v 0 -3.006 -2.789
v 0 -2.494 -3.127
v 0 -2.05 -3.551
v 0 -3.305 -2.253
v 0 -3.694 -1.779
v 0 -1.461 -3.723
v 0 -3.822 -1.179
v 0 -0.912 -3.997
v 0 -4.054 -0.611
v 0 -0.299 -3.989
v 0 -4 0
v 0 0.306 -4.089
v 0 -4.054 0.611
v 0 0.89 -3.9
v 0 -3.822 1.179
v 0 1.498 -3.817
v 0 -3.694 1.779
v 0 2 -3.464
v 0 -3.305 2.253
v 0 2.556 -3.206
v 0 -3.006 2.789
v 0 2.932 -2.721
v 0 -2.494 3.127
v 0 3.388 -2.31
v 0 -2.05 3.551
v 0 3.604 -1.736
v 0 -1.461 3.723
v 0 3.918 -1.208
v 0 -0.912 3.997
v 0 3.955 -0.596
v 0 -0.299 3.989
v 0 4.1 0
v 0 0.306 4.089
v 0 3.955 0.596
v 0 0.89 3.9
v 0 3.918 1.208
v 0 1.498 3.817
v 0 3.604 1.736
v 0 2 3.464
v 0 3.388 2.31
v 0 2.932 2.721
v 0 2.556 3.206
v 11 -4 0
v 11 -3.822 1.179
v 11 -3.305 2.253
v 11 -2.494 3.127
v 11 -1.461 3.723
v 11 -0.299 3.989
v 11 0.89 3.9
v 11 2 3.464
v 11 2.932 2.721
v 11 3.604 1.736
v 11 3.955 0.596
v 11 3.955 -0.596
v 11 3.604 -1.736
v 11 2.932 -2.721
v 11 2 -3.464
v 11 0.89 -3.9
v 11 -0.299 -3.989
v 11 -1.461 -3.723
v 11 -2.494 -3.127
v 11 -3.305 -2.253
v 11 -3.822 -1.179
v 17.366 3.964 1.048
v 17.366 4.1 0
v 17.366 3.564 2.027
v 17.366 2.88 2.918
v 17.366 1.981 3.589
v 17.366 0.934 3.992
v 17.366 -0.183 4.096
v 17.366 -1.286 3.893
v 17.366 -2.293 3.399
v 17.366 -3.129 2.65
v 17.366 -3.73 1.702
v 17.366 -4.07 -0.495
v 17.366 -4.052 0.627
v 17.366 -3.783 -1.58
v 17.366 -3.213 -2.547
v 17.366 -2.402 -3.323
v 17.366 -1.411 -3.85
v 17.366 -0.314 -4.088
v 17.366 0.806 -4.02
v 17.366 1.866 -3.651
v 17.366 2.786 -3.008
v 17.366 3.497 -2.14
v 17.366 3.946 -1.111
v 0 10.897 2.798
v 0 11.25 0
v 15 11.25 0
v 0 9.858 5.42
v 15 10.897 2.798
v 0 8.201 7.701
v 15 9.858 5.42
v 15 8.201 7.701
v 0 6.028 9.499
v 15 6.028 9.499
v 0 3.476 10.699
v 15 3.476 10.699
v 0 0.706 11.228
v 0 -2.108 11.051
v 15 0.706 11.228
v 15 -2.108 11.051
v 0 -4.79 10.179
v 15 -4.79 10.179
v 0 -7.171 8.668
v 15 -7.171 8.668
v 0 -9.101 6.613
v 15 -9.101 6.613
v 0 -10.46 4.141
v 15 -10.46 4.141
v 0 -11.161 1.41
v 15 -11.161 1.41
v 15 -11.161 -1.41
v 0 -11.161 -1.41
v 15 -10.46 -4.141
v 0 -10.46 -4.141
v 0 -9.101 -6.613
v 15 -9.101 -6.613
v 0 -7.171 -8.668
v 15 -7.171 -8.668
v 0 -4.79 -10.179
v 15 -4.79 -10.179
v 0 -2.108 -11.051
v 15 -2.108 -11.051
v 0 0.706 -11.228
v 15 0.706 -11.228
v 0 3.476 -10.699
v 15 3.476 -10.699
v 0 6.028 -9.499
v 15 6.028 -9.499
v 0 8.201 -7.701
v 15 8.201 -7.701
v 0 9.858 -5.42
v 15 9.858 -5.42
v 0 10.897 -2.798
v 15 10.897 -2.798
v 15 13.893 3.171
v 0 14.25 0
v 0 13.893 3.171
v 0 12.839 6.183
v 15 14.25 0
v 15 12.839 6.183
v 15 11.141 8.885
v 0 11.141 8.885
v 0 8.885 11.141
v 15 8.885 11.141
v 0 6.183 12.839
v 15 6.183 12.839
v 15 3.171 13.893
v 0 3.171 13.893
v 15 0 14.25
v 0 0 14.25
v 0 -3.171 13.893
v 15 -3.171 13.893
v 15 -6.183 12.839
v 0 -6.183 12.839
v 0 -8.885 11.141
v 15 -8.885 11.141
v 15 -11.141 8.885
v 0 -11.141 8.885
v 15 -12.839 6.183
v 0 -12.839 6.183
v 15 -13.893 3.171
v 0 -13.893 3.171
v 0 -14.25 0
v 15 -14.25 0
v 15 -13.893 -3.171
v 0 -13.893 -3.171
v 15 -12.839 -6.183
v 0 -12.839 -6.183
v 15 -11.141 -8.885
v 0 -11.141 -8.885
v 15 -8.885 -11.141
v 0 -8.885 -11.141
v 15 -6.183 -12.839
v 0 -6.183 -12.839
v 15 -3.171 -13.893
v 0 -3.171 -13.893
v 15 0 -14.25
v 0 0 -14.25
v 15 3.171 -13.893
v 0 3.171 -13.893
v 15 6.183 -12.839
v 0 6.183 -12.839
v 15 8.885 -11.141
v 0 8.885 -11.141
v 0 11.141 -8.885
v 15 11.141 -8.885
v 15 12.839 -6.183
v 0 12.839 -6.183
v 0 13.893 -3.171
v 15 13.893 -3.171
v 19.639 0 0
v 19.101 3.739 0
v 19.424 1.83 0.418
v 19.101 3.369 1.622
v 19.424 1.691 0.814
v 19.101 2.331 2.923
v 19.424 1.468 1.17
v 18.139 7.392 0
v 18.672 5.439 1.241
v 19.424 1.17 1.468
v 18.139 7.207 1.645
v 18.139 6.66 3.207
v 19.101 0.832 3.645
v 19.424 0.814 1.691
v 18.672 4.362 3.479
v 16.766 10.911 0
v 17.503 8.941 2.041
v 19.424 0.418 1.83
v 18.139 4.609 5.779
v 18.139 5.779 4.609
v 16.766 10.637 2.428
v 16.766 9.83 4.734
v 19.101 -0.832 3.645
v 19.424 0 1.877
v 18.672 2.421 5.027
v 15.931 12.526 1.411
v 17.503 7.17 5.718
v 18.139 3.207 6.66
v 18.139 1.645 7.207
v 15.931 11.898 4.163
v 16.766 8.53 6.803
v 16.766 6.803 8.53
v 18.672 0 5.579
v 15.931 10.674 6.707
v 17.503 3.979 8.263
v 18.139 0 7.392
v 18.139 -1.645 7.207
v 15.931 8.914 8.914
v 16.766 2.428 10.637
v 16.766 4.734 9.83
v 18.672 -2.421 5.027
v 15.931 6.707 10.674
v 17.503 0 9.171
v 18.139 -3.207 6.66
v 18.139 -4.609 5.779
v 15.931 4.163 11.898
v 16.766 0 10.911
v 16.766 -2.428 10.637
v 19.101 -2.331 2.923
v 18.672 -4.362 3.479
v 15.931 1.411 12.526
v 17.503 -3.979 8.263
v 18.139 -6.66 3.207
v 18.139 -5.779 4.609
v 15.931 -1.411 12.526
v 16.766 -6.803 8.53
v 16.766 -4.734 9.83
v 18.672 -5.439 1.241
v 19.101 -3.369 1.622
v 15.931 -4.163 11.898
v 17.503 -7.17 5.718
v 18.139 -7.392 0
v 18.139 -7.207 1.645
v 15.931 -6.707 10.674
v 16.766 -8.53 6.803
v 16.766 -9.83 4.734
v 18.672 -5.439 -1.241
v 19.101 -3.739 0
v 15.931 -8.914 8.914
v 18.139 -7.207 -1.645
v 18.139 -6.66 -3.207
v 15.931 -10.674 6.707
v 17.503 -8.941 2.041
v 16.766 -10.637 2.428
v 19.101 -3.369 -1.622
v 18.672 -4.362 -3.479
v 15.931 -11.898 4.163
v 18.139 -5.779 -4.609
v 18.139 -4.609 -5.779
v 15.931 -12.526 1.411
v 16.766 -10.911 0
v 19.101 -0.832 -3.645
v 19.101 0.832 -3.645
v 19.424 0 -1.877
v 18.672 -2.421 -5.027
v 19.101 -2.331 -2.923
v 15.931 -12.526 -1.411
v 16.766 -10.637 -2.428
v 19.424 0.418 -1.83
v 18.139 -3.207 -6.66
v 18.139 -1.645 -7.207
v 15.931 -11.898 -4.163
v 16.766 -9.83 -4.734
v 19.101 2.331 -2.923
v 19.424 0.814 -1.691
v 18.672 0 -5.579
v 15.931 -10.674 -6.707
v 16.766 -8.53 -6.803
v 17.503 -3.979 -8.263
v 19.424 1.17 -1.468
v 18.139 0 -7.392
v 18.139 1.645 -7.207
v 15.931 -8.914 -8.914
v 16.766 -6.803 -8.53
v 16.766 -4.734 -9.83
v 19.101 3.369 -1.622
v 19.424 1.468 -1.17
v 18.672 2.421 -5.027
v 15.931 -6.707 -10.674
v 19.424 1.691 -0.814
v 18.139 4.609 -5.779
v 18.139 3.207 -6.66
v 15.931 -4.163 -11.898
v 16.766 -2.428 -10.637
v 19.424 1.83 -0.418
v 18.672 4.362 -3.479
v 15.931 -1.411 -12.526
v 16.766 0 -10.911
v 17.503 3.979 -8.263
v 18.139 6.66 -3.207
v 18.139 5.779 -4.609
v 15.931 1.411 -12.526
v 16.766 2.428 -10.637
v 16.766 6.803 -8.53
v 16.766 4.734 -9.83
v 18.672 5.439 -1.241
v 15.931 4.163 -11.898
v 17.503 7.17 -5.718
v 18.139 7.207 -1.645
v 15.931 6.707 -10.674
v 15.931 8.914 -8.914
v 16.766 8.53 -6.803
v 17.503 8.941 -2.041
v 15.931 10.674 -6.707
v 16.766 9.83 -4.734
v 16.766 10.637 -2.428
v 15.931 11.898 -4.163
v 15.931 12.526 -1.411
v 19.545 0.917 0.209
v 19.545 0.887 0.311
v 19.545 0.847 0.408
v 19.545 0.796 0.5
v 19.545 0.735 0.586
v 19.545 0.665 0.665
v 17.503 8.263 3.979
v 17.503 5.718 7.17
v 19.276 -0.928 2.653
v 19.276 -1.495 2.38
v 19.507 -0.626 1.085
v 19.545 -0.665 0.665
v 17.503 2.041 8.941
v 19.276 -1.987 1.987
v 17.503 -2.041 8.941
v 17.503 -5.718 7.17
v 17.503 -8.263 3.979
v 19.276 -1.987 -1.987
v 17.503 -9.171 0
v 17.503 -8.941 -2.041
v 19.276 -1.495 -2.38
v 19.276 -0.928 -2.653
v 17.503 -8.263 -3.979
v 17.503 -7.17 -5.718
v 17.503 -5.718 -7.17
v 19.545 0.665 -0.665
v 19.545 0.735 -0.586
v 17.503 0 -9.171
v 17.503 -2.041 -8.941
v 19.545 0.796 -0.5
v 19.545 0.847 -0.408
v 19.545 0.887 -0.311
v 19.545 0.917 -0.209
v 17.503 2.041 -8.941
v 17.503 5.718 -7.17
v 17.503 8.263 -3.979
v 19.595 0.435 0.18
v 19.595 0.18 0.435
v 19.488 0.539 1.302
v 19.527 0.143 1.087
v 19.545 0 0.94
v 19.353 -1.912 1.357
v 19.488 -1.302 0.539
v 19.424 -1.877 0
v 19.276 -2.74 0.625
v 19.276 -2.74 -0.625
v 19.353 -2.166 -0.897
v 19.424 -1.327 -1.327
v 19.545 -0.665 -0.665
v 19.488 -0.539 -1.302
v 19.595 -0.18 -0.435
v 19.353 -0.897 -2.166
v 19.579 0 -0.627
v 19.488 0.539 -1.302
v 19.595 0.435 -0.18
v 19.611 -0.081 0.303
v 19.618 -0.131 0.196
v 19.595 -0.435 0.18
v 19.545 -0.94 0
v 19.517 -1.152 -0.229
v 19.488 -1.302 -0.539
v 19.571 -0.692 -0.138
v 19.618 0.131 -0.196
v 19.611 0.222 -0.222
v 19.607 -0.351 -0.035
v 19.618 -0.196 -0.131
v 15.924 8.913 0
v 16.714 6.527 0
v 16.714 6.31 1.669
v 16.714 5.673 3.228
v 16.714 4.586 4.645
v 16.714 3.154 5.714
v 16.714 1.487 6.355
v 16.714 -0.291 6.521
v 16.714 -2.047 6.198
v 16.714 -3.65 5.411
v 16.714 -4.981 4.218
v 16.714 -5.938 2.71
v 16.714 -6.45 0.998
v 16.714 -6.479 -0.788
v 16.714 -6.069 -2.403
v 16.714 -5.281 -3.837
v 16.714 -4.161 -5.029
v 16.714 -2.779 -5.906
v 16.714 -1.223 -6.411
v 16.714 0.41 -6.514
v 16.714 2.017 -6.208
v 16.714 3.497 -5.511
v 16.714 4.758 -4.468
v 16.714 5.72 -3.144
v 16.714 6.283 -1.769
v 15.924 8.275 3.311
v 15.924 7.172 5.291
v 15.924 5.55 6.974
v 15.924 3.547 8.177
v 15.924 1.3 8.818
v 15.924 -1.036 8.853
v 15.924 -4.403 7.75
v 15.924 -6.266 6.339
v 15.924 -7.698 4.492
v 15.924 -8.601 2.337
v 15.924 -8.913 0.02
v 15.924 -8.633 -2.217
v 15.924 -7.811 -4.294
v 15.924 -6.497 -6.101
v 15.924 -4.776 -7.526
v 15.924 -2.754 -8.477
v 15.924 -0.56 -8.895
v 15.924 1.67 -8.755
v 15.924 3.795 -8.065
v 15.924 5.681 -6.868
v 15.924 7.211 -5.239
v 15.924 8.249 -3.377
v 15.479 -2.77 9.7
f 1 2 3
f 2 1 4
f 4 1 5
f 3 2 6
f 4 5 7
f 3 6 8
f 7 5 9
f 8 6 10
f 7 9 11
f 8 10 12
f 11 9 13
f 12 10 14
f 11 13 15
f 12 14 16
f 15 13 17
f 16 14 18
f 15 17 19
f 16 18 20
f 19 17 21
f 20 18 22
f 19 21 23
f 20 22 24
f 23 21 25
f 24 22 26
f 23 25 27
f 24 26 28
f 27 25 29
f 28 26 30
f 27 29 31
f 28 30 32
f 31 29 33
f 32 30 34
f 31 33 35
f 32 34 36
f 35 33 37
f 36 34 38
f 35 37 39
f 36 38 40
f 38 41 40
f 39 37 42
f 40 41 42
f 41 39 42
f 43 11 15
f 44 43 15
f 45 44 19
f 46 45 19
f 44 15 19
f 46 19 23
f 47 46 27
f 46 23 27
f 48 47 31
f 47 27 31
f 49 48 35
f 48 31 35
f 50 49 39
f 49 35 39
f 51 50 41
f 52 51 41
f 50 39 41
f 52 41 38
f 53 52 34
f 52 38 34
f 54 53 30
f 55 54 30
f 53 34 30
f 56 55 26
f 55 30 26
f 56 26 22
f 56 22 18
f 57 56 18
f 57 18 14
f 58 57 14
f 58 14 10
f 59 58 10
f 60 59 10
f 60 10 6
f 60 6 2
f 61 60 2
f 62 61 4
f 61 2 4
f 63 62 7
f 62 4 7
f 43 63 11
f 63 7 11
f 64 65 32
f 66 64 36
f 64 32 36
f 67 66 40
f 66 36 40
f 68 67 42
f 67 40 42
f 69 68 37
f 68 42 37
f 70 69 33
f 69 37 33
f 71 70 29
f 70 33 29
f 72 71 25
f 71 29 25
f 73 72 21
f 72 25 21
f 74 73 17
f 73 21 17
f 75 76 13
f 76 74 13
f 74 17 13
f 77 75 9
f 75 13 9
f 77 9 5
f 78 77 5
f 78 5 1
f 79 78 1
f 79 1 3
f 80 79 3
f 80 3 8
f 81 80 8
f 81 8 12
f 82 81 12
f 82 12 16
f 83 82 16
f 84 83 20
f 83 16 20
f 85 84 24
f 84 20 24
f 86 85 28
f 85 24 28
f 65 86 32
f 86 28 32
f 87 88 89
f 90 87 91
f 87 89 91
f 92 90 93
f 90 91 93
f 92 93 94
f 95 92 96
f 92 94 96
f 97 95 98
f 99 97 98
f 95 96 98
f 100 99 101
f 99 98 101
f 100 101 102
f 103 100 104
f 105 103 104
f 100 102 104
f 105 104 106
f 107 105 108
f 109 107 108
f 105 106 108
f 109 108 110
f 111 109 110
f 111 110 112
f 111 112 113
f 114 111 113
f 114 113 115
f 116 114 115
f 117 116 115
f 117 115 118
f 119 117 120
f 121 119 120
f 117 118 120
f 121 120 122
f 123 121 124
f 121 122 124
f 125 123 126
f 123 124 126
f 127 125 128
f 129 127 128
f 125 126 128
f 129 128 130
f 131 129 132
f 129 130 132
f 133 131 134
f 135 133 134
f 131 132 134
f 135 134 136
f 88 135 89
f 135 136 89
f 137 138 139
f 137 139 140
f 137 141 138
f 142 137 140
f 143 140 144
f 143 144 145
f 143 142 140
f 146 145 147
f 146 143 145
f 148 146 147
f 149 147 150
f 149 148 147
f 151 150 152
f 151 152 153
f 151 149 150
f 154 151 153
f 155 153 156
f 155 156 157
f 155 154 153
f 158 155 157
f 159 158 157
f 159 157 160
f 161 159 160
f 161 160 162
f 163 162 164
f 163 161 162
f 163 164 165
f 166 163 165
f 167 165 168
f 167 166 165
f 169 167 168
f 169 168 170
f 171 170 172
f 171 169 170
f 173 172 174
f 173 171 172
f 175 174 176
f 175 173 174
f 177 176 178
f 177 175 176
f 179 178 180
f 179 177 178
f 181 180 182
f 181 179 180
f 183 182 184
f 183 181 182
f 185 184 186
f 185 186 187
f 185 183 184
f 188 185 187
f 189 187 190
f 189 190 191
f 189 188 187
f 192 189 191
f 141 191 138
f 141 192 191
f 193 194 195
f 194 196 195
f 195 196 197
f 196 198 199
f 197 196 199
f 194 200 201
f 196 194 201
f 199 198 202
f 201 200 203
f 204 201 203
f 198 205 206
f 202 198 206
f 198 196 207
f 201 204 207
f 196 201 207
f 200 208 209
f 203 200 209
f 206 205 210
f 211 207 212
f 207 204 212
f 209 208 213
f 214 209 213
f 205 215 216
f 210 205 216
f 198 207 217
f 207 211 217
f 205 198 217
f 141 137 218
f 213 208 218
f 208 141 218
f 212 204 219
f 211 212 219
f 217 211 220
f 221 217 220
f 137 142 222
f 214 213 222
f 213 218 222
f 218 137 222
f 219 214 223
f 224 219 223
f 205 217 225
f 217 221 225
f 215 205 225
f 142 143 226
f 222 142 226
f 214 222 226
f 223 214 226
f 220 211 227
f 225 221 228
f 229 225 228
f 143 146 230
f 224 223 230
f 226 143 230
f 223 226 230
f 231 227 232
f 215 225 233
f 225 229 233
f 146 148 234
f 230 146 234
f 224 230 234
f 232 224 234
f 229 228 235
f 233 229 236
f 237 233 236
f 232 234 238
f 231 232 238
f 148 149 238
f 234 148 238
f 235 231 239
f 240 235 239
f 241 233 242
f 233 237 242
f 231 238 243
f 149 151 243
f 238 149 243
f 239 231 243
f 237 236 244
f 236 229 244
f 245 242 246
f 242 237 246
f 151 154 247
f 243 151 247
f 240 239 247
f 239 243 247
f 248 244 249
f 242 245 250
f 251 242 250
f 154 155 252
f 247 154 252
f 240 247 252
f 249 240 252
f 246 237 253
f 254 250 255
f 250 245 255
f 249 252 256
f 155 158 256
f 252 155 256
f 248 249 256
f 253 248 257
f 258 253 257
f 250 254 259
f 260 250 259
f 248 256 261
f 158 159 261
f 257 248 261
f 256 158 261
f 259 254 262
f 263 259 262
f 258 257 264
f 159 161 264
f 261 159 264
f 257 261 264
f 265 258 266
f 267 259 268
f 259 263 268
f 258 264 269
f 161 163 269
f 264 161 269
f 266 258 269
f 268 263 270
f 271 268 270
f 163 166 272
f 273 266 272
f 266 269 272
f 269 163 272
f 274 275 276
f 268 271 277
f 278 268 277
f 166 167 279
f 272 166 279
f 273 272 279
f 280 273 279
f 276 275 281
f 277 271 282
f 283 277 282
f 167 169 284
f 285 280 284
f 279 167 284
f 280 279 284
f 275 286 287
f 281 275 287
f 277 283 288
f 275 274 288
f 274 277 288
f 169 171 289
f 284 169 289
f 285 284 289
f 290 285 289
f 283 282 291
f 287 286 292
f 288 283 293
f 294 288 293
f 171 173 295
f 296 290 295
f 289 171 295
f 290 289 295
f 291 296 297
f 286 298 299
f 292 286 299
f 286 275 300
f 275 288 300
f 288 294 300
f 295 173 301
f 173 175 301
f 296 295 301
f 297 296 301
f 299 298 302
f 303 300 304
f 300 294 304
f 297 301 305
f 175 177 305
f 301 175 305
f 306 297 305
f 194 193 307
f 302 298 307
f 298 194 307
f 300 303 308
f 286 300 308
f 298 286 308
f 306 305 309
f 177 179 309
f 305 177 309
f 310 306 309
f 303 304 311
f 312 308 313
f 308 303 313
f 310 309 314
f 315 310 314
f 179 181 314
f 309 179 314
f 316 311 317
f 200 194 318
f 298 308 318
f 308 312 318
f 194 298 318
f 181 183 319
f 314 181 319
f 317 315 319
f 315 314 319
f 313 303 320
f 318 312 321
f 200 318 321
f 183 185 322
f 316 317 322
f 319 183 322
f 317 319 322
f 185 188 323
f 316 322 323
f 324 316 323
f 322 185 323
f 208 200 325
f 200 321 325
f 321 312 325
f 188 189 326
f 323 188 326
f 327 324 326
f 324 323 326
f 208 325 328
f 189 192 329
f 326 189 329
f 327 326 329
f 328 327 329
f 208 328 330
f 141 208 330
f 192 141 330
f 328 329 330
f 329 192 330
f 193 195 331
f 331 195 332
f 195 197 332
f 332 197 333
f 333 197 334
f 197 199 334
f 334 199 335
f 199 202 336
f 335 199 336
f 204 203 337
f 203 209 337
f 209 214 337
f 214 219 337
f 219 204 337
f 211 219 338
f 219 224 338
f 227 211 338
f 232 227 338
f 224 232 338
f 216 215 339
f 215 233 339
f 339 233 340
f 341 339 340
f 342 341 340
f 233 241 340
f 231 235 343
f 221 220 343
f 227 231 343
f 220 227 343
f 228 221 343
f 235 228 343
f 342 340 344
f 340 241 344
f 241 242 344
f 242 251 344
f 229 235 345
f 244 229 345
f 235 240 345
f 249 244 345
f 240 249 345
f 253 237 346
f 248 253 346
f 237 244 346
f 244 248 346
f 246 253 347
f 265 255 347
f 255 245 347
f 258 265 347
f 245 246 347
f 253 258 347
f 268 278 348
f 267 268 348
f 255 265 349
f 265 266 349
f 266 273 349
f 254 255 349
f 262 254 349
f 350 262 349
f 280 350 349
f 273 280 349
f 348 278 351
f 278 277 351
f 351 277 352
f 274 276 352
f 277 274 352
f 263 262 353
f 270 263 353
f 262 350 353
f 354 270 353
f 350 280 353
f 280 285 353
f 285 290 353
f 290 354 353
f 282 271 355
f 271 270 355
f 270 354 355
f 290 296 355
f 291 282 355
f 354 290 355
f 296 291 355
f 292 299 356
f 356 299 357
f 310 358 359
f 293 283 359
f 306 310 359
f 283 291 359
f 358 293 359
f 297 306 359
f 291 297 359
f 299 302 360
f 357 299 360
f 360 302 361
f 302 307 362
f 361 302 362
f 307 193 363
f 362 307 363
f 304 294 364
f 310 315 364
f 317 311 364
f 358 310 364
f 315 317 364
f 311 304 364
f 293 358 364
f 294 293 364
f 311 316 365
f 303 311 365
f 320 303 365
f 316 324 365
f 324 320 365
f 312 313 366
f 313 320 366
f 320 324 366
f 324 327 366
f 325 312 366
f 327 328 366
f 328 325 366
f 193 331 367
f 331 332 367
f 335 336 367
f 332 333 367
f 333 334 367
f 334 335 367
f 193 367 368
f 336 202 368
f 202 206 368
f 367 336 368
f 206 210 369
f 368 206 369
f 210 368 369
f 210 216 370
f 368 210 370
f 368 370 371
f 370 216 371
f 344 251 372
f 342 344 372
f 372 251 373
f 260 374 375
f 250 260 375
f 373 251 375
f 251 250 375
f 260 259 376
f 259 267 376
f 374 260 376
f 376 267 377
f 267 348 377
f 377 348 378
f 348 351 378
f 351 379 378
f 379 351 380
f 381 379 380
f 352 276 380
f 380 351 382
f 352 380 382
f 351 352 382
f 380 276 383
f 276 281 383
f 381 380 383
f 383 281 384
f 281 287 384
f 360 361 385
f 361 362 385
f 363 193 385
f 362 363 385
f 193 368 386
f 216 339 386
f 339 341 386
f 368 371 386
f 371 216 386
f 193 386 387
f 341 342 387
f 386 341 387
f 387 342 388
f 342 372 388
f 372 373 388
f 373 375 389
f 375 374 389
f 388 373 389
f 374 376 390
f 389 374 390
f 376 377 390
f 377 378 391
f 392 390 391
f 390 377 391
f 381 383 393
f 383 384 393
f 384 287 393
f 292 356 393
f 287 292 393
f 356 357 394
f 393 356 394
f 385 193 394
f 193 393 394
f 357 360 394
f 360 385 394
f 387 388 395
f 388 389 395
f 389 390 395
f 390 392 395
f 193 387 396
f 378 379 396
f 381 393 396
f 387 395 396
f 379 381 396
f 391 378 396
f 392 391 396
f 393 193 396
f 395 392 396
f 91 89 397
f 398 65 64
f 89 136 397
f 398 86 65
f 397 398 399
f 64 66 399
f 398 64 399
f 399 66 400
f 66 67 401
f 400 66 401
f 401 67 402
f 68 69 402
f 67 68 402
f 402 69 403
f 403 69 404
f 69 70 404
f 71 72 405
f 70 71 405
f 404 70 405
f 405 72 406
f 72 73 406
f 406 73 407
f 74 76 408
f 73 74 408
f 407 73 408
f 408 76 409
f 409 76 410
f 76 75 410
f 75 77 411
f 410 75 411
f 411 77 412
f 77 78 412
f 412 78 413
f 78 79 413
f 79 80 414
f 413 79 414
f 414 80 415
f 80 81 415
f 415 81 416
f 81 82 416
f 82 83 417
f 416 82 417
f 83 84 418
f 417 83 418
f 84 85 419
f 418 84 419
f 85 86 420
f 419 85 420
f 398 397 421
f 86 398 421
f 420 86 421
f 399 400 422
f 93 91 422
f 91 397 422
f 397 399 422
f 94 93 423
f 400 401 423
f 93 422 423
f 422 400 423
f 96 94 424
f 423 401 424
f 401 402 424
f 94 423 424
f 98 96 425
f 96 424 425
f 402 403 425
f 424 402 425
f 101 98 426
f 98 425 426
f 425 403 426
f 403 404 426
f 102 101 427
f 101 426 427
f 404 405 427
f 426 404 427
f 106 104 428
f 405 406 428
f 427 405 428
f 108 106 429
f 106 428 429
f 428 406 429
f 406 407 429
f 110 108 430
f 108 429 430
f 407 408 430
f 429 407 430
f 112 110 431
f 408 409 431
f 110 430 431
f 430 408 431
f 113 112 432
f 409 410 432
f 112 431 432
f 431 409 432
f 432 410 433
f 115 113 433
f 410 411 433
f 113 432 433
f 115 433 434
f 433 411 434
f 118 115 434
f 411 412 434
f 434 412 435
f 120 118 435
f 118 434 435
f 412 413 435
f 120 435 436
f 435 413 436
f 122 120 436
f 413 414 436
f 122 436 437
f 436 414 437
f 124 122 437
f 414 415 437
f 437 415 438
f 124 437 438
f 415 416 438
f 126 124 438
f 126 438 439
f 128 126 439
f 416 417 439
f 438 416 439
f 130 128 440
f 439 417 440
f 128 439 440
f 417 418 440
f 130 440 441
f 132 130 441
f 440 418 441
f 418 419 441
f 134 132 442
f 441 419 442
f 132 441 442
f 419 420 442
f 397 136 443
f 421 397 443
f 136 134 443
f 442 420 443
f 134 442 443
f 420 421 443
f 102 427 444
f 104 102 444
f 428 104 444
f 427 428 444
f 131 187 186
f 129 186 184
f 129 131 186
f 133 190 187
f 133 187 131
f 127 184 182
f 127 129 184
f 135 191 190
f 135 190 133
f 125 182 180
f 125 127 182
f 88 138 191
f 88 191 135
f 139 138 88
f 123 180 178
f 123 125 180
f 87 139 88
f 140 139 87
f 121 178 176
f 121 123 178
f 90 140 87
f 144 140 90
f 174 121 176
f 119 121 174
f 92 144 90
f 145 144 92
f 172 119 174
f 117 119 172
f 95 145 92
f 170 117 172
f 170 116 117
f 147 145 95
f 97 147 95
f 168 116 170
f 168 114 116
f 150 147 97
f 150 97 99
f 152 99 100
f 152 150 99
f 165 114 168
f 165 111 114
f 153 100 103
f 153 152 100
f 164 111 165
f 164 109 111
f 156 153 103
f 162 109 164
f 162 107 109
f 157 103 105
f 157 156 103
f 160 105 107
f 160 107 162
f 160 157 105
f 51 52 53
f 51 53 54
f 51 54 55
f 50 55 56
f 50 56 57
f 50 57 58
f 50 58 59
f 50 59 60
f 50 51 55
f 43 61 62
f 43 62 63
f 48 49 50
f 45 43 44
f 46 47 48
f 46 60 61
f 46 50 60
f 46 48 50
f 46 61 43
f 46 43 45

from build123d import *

# Parameters (mm, degrees)
F0_W     = 15
F0_H     = 3
F2_R     = 4.1
F4_R     = 4
F5_DEPTH = 11


with BuildPart() as f1:
    # F0 (on Top) → F1 (revolve)
    with BuildSketch(Plane.XY):
        with Locations((7.5, 12.75)):
            Rectangle(F0_W, F0_H)
        with BuildLine():
            ThreePointArc((19.6392323583, 0), (18.1392323583, 7.3918343789), (15, 14.25))
            Line((15, 14.25), (15, 11.25))
            ThreePointArc((15, 11.25), (16.9445632196, 5.7296263006), (18.1392323583, 0))
            Line((18.1392323583, 0), (19.6392323583, 0))
        make_face()
    revolve(axis=Axis((16.0183925182, 0, 0), (1, 0, 0)))

    # F2 (on Right) → F3 (join, up to the next surface of F1)
    with BuildSketch(Plane.YZ):
        Circle(F2_R)
    extrude(until=Until.NEXT)

    # F4 (on face) → F5 (cut)
    with BuildSketch(Plane(origin=(0, 0, 0), x_dir=(0, -1, 0), z_dir=(-1, 0, 0))):
        Circle(F4_R)
    extrude(amount=-F5_DEPTH, mode=Mode.SUBTRACT)


solid = f1.part
